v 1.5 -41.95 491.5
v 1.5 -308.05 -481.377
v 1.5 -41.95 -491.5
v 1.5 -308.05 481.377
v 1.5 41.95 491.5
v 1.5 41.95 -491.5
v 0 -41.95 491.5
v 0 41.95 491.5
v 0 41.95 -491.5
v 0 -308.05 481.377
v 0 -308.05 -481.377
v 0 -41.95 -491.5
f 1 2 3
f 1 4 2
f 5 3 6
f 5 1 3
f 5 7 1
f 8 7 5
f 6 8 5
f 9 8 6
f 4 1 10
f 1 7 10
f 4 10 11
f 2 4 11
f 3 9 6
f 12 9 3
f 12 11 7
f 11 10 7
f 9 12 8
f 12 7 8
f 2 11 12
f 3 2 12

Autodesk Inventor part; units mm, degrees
ref_plane "YZ Plane" through (0, 0, 0) normal (1, 0, 0) x (0, 1, 0)
ref_plane "XZ Plane" through (0, 0, 0) normal (0, 1, 0) x (-1, 0, 0)
ref_plane "XY Plane" through (0, 0, 0) normal (0, 0, 1) x (1, 0, 0)
sketch "Sketch1" plane through (0, 0, 0) normal (1, 0, 0) x (0, 1, 0)
  line L0 (-41.95, 491.5) -> (41.95, 491.5)
  line L1 (41.95, 491.5) -> (41.95, -491.5)
  line L2 (41.95, -491.5) -> (-41.95, -491.5)
  line L3 (-41.95, -491.5) -> (-41.95, 491.5)
  line L4 (-41.95, 491.5) -> (41.95, -491.5) construction
  line L5 (41.95, 491.5) -> (-41.95, -491.5) construction
  line L6 (-41.95, 491.5) -> (-988.2655, 455.5)
  line L7 (-988.2655, 455.5) -> (-988.2655, -455.5)
  line L8 (-988.2655, -455.5) -> (-41.95, -491.5)
  line L9 (-308.05, 481.3769) -> (-308.05, -481.3769)
  point P0 (0, 0)
  point P1 (-988.2655, 0)
  point P2 (-41.95, 0)
  dimension "d0" = 983
  dimension "d1" = 83.9
  dimension "d3" = 911
  dimension "d4" = 947
  dimension "d5" = 350
extrude "Plate1" add sketch "Sketch1" along normal blind 1.5 contours L0 L1 L2 L3 | L3 L8 L9 L6
equation "\"d6\" = Thickness"
equation "\"BendRadius\" = Thickness"
equation "\"BendReliefWidth\" = Thickness"
equation "\"BendReliefDepth\" = 0.5 * Thickness"
equation "\"CornerReliefSize\" = 4 * Thickness"
equation "\"MinimumRemnant\" = 2 * Thickness"
equation "\"TransitionRadius\" = BendRadius"
equation "\"JacobiRadiusSize\" = BendRadius"
equation "\"GapSize\" = Thickness"
equation "\"Thickness\" = 1.5"
properties part number "CHAPA_2" material "Steel, Mild, Welded"
